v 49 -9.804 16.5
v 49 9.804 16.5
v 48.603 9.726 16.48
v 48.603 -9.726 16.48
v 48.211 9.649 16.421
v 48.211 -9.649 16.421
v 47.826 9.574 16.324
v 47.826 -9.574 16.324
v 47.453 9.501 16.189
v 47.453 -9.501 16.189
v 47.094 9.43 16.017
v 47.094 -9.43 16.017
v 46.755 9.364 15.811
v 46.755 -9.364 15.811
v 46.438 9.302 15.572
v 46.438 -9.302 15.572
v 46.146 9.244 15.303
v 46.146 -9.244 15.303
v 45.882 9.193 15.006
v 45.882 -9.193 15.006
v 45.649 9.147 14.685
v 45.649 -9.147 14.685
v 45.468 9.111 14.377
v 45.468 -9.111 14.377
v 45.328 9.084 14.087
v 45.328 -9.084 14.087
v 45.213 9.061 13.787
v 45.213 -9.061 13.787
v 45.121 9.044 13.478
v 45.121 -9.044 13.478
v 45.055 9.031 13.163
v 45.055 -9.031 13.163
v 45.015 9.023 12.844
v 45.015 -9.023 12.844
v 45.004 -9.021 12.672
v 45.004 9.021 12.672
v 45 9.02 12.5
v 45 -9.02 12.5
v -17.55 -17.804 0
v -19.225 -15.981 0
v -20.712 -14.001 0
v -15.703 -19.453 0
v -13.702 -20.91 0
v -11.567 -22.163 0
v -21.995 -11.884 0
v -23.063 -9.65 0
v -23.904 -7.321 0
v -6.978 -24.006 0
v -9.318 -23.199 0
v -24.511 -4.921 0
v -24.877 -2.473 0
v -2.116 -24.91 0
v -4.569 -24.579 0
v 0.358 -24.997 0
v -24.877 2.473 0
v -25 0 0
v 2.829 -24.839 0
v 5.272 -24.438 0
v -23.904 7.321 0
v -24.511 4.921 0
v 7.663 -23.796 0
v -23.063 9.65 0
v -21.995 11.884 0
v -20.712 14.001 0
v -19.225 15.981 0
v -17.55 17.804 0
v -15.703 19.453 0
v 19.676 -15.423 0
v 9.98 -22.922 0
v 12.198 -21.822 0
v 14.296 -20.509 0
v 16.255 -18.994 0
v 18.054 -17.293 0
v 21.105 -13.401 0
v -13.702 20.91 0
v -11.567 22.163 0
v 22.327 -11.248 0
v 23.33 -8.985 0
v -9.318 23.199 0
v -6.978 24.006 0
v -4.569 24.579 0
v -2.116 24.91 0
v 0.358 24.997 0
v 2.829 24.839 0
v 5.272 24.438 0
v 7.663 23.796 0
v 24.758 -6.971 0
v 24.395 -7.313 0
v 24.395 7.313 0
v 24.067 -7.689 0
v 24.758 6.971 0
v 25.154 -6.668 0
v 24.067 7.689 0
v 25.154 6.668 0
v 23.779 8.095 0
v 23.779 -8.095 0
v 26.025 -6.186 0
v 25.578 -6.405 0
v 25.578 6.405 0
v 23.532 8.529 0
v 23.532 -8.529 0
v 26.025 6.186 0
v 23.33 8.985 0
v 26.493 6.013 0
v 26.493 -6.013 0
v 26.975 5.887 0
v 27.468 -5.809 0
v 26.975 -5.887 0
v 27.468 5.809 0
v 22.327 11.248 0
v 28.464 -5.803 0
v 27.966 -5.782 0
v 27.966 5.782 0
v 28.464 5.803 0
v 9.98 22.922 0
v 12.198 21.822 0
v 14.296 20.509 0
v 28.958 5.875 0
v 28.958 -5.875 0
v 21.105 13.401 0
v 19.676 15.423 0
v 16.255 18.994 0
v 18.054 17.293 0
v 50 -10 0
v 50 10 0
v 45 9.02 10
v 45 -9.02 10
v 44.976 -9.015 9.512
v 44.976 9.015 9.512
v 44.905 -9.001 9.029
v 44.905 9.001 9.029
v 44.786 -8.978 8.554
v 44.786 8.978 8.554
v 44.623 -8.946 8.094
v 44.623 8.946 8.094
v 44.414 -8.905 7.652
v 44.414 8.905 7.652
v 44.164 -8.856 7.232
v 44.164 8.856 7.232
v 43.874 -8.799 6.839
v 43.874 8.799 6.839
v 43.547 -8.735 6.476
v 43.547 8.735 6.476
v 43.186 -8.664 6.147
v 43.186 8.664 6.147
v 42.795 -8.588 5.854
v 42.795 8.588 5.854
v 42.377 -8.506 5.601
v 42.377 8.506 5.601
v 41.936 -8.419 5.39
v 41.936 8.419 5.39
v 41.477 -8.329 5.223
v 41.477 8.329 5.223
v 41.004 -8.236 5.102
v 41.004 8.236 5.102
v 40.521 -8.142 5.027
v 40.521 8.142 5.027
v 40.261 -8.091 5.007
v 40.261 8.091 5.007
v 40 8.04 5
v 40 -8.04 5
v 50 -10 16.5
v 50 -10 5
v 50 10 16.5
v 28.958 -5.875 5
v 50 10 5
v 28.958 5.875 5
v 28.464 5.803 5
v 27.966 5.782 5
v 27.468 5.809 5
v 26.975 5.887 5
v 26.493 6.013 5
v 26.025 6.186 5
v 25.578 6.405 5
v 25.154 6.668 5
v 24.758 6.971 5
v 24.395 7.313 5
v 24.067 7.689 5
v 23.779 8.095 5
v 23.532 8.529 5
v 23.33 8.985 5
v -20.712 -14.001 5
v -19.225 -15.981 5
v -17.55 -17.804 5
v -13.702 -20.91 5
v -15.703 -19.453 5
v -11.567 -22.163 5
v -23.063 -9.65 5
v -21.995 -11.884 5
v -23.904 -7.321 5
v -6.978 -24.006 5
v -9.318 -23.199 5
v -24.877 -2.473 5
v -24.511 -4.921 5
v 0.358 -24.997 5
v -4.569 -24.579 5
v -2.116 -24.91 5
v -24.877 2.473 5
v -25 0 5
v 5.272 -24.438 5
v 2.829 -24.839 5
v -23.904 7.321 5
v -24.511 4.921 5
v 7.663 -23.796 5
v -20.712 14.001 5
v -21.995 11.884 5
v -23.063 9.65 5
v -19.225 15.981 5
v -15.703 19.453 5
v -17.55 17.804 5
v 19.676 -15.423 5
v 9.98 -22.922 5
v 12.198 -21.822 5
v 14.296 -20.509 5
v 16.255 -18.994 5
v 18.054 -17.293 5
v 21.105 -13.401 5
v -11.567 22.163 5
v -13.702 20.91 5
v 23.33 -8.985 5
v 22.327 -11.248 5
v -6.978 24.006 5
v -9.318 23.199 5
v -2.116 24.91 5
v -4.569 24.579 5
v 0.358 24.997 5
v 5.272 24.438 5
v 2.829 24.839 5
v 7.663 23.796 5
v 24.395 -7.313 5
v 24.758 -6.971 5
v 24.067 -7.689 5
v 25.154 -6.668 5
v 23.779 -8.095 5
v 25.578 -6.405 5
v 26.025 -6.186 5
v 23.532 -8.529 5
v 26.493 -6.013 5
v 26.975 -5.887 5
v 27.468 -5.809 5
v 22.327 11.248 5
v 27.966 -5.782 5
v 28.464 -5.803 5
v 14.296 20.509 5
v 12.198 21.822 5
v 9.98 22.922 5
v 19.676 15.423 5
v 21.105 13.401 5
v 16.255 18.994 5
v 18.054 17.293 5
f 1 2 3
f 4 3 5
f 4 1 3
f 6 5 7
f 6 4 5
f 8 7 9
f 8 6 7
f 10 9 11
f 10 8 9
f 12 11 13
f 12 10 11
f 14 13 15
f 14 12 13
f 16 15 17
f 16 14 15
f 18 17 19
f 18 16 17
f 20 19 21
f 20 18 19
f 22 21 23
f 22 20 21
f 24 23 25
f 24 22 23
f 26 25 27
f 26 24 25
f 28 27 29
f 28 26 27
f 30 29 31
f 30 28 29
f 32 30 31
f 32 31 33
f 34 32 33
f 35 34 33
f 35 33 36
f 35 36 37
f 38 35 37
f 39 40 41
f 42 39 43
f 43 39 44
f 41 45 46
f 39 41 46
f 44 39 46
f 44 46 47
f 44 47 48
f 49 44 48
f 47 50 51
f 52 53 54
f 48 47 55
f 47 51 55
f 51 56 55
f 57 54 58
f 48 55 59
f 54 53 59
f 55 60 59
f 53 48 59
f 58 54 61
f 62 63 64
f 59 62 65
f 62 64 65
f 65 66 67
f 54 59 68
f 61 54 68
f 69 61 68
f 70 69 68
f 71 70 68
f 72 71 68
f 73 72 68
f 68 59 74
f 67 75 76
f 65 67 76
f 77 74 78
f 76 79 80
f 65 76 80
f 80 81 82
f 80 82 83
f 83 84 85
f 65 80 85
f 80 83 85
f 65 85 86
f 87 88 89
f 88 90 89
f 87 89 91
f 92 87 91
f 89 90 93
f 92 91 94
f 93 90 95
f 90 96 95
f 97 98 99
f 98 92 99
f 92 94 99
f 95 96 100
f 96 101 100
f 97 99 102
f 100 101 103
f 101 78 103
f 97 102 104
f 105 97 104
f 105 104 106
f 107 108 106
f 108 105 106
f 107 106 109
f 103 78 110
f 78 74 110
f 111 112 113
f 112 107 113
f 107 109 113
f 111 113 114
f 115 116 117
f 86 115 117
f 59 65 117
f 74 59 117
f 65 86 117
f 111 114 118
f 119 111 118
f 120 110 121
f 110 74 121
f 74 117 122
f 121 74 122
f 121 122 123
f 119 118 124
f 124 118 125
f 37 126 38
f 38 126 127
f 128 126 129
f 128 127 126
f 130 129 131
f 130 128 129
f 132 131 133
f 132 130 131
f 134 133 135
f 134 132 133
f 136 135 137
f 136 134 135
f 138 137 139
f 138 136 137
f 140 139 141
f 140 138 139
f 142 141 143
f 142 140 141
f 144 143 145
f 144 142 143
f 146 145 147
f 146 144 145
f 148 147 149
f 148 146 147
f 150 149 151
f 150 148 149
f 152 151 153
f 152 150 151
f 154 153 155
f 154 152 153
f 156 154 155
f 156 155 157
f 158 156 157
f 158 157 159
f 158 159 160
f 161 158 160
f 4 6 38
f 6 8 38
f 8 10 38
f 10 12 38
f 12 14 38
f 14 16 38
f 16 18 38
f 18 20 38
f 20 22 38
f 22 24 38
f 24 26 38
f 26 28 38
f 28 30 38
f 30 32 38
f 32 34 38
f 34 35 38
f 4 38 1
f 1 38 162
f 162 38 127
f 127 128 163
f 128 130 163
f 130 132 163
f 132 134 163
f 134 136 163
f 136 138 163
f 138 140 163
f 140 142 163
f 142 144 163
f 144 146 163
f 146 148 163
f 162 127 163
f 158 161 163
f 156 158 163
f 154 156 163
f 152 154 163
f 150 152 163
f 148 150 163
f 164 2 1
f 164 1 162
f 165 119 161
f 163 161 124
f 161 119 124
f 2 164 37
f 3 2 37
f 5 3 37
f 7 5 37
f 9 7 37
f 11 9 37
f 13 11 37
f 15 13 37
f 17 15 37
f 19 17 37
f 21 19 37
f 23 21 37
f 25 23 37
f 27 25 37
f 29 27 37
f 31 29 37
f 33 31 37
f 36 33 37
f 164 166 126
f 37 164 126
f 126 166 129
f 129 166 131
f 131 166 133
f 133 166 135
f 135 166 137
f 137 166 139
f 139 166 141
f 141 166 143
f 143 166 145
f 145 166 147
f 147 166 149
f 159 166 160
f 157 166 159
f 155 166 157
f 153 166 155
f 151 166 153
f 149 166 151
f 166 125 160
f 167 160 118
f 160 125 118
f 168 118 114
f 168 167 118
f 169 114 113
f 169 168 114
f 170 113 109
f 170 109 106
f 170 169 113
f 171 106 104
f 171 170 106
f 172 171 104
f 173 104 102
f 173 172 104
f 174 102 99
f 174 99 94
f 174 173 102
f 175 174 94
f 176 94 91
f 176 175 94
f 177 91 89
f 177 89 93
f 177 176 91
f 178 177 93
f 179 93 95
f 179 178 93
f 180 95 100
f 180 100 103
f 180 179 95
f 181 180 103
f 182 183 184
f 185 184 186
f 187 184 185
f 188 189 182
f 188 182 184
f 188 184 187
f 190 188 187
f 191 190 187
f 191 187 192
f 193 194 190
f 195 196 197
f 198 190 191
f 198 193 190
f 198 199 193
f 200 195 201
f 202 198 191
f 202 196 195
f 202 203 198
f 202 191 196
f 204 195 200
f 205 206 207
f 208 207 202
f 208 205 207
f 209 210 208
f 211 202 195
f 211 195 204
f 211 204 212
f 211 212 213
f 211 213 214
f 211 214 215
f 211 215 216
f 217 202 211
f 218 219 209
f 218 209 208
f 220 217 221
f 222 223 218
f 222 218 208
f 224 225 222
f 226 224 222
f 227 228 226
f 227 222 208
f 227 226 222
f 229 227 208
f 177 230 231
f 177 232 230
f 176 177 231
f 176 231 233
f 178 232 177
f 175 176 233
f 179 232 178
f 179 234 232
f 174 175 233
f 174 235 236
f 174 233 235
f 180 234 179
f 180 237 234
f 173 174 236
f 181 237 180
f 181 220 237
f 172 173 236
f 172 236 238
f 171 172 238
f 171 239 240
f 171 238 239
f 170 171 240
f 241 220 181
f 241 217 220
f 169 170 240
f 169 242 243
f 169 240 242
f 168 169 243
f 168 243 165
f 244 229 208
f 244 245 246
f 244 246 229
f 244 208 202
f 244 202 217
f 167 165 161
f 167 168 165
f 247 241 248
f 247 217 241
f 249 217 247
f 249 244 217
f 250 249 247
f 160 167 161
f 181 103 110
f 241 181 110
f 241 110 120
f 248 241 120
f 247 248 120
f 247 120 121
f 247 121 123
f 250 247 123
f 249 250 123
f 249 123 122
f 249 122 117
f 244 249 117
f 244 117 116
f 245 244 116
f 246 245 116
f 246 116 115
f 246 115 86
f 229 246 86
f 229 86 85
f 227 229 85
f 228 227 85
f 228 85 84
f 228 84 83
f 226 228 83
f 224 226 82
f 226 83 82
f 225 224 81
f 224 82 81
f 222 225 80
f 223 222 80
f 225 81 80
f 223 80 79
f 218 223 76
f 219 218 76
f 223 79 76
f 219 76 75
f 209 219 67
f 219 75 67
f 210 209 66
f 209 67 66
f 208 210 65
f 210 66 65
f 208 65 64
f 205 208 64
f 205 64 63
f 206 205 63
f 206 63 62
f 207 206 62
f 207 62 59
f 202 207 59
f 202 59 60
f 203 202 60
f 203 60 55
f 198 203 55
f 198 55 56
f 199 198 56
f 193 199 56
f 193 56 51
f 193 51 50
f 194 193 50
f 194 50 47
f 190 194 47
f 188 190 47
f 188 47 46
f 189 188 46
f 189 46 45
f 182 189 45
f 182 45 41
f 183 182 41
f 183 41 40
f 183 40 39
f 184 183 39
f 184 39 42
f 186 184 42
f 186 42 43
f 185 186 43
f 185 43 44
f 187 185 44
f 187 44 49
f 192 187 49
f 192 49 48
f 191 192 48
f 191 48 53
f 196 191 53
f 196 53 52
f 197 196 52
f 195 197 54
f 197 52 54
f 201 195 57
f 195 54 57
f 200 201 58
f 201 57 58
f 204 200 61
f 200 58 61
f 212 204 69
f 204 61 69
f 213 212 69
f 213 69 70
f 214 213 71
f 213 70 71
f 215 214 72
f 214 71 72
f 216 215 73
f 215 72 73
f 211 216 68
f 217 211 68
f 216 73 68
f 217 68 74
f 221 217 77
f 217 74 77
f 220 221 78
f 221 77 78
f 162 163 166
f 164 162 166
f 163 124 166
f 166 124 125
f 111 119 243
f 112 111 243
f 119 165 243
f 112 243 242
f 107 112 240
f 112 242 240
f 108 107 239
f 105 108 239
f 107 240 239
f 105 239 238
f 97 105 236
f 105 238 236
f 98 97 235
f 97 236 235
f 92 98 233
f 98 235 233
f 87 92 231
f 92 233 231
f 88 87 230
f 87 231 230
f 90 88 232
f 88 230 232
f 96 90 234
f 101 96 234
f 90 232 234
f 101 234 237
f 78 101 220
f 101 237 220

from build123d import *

# Parameters (mm, degrees)
F1_DEPTH = 5
F3_DEPTH = 11.5
F4_R     = 5
F5_R     = 4


with BuildPart() as f1:
    # F0 (on Top) → F1 (new body)
    with BuildSketch(Plane.XY):
        with BuildLine():
            Line((50, 10), (24.494897, 5))
            ThreePointArc((24.494897, 5), (-25, 0), (24.494897, -5))
            Line((24.494897, -5), (50, -10))
            Line((50, -10), (50, 10))
        make_face()
    extrude(amount=F1_DEPTH)

    # F2 (on face) → F3 (join)
    with BuildSketch(Plane.XY.offset(5)):
        Polygon((50, -10), (50, 10), (45, 9.019804), (45, -9.019804), align=None)
    extrude(amount=F3_DEPTH)

    # F4
    f4_edges = [f1.edges().sort_by_distance(p)[0] for p in [
        (24.494897, 5, 2.5),
        (24.494897, -5, 2.5),
        (45, 0, 5),
    ]]
    fillet(f4_edges, radius=F4_R)

    # F5
    f5_edges = [f1.edges().sort_by_distance(p)[0] for p in [
        (45, 0, 16.5),
    ]]
    fillet(f5_edges, radius=F5_R)


solid = f1.part
